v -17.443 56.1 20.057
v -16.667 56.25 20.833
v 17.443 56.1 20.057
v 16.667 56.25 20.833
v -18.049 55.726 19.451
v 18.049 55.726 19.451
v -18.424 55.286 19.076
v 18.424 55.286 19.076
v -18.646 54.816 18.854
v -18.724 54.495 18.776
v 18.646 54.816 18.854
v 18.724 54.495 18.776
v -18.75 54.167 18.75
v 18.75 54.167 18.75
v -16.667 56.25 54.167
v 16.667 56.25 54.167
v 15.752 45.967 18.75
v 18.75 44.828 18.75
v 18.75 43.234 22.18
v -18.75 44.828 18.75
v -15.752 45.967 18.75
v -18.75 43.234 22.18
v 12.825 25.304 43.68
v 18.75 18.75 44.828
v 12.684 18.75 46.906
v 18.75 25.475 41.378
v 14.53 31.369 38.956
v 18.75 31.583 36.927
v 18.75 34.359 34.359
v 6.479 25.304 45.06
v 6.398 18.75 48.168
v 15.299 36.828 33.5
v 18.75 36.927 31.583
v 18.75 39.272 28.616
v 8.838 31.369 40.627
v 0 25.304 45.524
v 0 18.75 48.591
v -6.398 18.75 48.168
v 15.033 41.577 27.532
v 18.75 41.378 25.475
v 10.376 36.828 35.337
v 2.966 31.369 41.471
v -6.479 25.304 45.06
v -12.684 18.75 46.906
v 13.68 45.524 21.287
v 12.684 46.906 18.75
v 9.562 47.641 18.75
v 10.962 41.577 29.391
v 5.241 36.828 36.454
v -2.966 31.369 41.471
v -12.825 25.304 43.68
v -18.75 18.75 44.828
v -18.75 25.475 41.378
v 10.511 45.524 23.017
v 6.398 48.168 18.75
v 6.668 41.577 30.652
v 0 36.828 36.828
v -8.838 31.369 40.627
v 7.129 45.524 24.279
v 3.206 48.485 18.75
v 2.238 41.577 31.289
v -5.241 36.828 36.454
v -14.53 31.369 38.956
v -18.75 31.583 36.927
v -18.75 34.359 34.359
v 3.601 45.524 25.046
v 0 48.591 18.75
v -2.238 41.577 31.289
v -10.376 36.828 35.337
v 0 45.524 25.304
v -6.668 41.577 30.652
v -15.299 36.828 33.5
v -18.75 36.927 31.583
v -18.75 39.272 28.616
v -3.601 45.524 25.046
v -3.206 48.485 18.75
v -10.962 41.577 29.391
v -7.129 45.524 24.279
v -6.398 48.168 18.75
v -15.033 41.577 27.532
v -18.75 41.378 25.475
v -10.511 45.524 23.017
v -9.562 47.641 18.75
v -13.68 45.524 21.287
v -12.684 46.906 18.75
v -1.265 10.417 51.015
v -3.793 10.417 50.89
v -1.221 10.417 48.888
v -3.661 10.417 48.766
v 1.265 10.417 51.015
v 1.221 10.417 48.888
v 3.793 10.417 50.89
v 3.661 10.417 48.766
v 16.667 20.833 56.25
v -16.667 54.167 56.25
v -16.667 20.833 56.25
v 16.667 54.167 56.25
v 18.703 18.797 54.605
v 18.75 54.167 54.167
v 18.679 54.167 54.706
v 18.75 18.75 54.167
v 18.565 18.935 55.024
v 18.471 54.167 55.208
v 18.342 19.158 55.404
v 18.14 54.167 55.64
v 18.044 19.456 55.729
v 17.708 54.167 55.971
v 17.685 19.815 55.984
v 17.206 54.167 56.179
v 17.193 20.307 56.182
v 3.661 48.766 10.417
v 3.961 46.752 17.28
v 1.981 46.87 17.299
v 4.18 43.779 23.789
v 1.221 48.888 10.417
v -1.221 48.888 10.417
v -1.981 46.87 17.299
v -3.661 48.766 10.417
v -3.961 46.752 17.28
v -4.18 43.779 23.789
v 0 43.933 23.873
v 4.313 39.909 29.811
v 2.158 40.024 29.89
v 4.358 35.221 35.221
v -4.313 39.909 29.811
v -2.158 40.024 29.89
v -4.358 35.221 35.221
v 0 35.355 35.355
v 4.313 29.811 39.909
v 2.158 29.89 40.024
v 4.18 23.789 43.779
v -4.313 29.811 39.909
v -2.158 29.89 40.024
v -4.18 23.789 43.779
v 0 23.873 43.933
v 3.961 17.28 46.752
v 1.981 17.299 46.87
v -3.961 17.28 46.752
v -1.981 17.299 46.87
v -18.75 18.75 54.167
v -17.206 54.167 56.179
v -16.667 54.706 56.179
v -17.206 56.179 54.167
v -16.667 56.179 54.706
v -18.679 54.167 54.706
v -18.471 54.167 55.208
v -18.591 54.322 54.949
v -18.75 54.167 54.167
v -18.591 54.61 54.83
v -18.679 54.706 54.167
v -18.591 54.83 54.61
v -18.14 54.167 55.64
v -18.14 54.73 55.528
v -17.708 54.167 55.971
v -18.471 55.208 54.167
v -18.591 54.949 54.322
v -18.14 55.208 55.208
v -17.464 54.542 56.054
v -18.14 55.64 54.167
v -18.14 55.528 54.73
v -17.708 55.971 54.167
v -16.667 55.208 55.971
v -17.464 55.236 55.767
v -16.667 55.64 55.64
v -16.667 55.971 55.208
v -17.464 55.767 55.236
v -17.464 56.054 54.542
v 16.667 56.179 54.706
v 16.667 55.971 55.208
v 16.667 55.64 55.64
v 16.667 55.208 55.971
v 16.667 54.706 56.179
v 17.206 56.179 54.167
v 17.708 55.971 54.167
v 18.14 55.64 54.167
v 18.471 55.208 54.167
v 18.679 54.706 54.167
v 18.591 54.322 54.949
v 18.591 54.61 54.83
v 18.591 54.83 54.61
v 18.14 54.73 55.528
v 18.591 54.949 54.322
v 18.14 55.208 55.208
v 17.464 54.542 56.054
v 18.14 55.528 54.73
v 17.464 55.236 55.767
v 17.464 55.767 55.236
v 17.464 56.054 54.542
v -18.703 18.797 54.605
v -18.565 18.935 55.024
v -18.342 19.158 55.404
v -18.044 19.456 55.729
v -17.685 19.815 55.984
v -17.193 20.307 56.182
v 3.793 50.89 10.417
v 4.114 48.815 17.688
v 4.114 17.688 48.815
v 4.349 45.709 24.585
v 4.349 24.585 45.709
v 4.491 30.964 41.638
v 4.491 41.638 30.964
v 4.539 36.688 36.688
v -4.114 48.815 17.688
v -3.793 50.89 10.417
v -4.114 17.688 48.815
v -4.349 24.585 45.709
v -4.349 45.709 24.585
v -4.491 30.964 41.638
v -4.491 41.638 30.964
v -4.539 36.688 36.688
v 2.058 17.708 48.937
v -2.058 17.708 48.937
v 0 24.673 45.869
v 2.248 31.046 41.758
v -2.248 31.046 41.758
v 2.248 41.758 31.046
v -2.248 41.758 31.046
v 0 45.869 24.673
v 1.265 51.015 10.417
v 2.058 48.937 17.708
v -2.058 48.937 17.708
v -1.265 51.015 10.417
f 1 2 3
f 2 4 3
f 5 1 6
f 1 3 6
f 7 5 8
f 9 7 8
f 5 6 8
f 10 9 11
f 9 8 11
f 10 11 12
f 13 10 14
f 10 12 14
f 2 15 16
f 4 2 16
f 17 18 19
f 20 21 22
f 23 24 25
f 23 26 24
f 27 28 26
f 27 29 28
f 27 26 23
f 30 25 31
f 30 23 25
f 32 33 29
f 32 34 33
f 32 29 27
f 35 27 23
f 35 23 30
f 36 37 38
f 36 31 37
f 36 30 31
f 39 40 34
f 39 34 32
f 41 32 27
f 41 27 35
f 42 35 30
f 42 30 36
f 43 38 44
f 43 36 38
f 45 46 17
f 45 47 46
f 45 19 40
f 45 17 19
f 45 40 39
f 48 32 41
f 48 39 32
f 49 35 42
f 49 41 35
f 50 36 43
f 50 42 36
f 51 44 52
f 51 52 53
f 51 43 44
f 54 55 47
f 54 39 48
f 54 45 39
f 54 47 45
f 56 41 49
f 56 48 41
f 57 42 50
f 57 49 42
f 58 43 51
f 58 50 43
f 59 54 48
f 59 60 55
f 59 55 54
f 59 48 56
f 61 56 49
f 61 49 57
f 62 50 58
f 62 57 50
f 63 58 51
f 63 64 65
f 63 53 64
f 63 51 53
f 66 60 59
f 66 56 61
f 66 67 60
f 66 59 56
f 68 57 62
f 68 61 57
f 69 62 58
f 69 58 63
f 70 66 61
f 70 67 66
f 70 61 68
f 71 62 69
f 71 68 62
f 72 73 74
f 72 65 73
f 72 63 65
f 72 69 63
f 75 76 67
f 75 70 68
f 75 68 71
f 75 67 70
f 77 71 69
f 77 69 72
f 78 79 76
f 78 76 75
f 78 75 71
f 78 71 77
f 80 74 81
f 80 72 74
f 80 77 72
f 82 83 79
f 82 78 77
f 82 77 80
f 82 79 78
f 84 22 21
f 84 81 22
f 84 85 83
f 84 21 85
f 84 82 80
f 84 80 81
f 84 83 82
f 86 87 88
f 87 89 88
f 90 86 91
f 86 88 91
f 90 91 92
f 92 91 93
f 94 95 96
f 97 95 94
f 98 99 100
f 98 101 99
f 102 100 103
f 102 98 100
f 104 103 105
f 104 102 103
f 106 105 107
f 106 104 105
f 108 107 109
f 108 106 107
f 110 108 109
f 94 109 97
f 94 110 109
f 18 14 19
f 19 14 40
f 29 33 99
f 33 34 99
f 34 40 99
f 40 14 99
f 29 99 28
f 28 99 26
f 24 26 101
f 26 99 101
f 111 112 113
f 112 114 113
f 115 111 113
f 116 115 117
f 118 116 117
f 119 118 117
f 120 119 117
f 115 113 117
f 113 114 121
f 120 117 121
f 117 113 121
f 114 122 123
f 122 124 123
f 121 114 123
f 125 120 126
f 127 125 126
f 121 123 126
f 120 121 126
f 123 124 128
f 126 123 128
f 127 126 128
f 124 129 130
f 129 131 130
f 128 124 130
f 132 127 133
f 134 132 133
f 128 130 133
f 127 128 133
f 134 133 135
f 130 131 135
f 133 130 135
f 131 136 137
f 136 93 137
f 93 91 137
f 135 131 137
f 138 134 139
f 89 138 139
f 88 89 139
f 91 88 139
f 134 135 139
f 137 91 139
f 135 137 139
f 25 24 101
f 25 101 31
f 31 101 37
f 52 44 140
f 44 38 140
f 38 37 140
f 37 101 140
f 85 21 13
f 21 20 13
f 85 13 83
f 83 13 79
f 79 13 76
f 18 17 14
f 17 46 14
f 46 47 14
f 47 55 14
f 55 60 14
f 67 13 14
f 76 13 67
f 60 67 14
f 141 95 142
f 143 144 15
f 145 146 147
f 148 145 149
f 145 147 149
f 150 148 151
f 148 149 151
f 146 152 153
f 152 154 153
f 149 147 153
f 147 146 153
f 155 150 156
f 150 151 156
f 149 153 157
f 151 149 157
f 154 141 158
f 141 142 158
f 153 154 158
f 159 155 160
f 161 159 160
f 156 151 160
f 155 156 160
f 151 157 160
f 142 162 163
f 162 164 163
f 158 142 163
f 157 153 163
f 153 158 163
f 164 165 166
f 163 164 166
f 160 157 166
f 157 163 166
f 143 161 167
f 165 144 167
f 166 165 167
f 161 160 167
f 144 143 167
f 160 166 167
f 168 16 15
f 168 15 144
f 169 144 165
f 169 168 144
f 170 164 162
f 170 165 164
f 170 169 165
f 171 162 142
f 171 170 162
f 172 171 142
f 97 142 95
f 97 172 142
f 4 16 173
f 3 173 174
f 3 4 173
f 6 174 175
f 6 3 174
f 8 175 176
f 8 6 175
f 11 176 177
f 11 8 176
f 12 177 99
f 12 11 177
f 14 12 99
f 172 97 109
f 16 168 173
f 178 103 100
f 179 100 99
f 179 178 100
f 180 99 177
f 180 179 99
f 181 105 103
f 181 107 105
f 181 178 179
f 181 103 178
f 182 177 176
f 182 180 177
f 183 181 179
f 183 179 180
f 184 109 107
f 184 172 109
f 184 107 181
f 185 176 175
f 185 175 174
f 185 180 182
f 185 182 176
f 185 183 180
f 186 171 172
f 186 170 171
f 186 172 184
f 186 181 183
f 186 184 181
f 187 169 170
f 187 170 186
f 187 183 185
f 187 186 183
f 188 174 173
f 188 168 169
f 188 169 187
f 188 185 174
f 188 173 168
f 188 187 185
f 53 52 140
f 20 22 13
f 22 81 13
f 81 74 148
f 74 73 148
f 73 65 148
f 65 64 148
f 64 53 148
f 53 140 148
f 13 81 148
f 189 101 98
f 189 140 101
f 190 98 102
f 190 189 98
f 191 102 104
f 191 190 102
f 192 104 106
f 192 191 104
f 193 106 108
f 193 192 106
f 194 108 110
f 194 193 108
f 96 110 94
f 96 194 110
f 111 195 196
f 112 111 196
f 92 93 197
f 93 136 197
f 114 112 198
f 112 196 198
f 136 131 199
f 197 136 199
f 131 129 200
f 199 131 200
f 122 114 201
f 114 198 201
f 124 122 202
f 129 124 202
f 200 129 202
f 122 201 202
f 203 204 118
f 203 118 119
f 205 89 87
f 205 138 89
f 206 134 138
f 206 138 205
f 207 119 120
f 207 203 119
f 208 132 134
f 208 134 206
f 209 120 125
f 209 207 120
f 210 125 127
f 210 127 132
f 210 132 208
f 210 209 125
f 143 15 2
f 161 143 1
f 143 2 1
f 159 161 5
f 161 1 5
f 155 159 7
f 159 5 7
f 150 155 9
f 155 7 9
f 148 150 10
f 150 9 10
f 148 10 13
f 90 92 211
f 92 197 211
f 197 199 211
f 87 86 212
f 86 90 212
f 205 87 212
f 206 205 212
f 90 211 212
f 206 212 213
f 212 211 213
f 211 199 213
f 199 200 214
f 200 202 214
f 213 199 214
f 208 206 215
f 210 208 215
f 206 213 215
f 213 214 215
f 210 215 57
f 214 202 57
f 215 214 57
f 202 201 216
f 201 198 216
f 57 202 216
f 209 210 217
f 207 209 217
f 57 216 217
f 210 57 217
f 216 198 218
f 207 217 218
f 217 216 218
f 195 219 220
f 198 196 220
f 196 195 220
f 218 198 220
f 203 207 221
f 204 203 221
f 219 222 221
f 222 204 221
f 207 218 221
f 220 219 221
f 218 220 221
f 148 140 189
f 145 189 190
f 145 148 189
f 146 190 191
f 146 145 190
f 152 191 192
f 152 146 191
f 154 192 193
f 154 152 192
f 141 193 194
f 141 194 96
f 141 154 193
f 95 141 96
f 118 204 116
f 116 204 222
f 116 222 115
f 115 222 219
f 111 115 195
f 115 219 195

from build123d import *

# Parameters (mm, degrees)
SKETCH_1_W          = 54
SKETCH_1_H          = 54
EXTRUDE_1_DEPTH     = 27
CUT_EXTRUDE_1_DEPTH = 54
SKETCH_3_W          = 18
SKETCH_3_H          = 36
CUT_EXTRUDE_2_DEPTH = 34.674916481
REVOLVE_3_ANGLE     = 10
SKETCH_7_W          = 18.755996754
SKETCH_7_H          = 27.576886317
CUT_EXTRUDE_3_DEPTH = 36.972211497
SKETCH_8_W          = 19.05446657
SKETCH_8_H          = 22.981146603
CUT_EXTRUDE_4_DEPTH = 36.972211497
FILLET_1_R          = 1
SCALE_1_SCALE       = 2.083333333


with BuildPart() as part:
    # 草图1 → 凸台-拉伸1 (new, symmetric)
    with BuildSketch(Plane.XY):
        Rectangle(SKETCH_1_W, SKETCH_1_H)
    extrude(amount=EXTRUDE_1_DEPTH, both=True)

    # 草图2 → 切除-拉伸1 (cut)
    with BuildSketch(Plane.XY.offset(27)):
        Polygon((-9, 27), (-27, 27), (-27, -27), (27, -27), (27, 27), (9, 27), (9, 9), (-9, 9), align=None)
    extrude(amount=-CUT_EXTRUDE_1_DEPTH, mode=Mode.SUBTRACT)

    # 草图3 → 切除-拉伸2 (cut, through all)
    with BuildSketch(Plane(origin=(0, 27, 0), x_dir=(1, 0, 0), z_dir=(0, 1, 0))):
        with Locations((0, 9)):
            Rectangle(SKETCH_3_W, SKETCH_3_H)
    extrude(amount=-CUT_EXTRUDE_2_DEPTH, mode=Mode.SUBTRACT)

    # 草图4 → 切除-旋转1 (revolve, cut)
    with BuildSketch(Plane(origin=(0, 0, 0), x_dir=(0, 0, -1), z_dir=(1, 0, 0))):
        with BuildLine():
            Line((0, 25), (0, -25))
            ThreePointArc((0, -25), (-25, 0), (0, 25))
        make_face()
    revolve(axis=Axis((0, 25, 0), (0, -1, 0)), mode=Mode.SUBTRACT)

    # 圆角1
    fillet_1_edges = [part.edges().sort_by_distance(p)[0] for p in [
        (0, 27, 27),
        (-9, 18, 27),
        (9, 18, 27),
        (0, 9, 27),
        (9, 27, 18),
        (-9, 27, 18),
        (0, 27, 9),
    ]]
    fillet(fillet_1_edges, radius=FILLET_1_R)


with BuildPart() as body_2:
    # 草图5 → 旋转3 (revolve, symmetric)
    with BuildSketch(Plane(origin=(0, 0, 0), x_dir=(0, 0, -1), z_dir=(1, 0, 0))) as revolve_3_sk:
        with BuildLine():
            Line((0, 25), (0, 24))
            ThreePointArc((0, 24), (-16.970562748, 16.970562748), (-24, 0))
            Line((-24, 0), (-25, 0))
            ThreePointArc((-25, 0), (-17.67766953, 17.67766953), (0, 25))
        make_face()
    revolve(axis=Axis((0, 0, 0), (0, 0.7071067811865489, -0.7071067811865461)), revolution_arc=REVOLVE_3_ANGLE / 2)
    revolve(revolve_3_sk.sketch, axis=Axis((0, 0, 0), (0, -0.7071067811865489, 0.7071067811865461)), revolution_arc=REVOLVE_3_ANGLE / 2)

    # 草图7 → 切除-拉伸3 (cut, through all)
    with BuildSketch(Plane(origin=(0, 5, 0), x_dir=(1, 0, 0), z_dir=(0, 1, 0))):
        with Locations((0.092851469, -13.520739947)):
            Rectangle(SKETCH_7_W, SKETCH_7_H)
    extrude(amount=-CUT_EXTRUDE_3_DEPTH, mode=Mode.SUBTRACT)

    # 草图8 → 切除-拉伸4 (cut, through all)
    with BuildSketch(Plane.XY.offset(5)):
        with Locations((-0.012585513, 15.886730384)):
            Rectangle(SKETCH_8_W, SKETCH_8_H)
    extrude(amount=-CUT_EXTRUDE_4_DEPTH, mode=Mode.SUBTRACT)


with BuildPart() as body_2_1:
    # 缩放比例1: scaled about (0, 0, 0)
    add(body_2.part.scale(SCALE_1_SCALE))


with BuildPart() as part_1:
    # 缩放比例1: scaled about (0, 0, 0)
    add(part.part.scale(SCALE_1_SCALE))


solid = Compound([body_2_1.part, part_1.part])
